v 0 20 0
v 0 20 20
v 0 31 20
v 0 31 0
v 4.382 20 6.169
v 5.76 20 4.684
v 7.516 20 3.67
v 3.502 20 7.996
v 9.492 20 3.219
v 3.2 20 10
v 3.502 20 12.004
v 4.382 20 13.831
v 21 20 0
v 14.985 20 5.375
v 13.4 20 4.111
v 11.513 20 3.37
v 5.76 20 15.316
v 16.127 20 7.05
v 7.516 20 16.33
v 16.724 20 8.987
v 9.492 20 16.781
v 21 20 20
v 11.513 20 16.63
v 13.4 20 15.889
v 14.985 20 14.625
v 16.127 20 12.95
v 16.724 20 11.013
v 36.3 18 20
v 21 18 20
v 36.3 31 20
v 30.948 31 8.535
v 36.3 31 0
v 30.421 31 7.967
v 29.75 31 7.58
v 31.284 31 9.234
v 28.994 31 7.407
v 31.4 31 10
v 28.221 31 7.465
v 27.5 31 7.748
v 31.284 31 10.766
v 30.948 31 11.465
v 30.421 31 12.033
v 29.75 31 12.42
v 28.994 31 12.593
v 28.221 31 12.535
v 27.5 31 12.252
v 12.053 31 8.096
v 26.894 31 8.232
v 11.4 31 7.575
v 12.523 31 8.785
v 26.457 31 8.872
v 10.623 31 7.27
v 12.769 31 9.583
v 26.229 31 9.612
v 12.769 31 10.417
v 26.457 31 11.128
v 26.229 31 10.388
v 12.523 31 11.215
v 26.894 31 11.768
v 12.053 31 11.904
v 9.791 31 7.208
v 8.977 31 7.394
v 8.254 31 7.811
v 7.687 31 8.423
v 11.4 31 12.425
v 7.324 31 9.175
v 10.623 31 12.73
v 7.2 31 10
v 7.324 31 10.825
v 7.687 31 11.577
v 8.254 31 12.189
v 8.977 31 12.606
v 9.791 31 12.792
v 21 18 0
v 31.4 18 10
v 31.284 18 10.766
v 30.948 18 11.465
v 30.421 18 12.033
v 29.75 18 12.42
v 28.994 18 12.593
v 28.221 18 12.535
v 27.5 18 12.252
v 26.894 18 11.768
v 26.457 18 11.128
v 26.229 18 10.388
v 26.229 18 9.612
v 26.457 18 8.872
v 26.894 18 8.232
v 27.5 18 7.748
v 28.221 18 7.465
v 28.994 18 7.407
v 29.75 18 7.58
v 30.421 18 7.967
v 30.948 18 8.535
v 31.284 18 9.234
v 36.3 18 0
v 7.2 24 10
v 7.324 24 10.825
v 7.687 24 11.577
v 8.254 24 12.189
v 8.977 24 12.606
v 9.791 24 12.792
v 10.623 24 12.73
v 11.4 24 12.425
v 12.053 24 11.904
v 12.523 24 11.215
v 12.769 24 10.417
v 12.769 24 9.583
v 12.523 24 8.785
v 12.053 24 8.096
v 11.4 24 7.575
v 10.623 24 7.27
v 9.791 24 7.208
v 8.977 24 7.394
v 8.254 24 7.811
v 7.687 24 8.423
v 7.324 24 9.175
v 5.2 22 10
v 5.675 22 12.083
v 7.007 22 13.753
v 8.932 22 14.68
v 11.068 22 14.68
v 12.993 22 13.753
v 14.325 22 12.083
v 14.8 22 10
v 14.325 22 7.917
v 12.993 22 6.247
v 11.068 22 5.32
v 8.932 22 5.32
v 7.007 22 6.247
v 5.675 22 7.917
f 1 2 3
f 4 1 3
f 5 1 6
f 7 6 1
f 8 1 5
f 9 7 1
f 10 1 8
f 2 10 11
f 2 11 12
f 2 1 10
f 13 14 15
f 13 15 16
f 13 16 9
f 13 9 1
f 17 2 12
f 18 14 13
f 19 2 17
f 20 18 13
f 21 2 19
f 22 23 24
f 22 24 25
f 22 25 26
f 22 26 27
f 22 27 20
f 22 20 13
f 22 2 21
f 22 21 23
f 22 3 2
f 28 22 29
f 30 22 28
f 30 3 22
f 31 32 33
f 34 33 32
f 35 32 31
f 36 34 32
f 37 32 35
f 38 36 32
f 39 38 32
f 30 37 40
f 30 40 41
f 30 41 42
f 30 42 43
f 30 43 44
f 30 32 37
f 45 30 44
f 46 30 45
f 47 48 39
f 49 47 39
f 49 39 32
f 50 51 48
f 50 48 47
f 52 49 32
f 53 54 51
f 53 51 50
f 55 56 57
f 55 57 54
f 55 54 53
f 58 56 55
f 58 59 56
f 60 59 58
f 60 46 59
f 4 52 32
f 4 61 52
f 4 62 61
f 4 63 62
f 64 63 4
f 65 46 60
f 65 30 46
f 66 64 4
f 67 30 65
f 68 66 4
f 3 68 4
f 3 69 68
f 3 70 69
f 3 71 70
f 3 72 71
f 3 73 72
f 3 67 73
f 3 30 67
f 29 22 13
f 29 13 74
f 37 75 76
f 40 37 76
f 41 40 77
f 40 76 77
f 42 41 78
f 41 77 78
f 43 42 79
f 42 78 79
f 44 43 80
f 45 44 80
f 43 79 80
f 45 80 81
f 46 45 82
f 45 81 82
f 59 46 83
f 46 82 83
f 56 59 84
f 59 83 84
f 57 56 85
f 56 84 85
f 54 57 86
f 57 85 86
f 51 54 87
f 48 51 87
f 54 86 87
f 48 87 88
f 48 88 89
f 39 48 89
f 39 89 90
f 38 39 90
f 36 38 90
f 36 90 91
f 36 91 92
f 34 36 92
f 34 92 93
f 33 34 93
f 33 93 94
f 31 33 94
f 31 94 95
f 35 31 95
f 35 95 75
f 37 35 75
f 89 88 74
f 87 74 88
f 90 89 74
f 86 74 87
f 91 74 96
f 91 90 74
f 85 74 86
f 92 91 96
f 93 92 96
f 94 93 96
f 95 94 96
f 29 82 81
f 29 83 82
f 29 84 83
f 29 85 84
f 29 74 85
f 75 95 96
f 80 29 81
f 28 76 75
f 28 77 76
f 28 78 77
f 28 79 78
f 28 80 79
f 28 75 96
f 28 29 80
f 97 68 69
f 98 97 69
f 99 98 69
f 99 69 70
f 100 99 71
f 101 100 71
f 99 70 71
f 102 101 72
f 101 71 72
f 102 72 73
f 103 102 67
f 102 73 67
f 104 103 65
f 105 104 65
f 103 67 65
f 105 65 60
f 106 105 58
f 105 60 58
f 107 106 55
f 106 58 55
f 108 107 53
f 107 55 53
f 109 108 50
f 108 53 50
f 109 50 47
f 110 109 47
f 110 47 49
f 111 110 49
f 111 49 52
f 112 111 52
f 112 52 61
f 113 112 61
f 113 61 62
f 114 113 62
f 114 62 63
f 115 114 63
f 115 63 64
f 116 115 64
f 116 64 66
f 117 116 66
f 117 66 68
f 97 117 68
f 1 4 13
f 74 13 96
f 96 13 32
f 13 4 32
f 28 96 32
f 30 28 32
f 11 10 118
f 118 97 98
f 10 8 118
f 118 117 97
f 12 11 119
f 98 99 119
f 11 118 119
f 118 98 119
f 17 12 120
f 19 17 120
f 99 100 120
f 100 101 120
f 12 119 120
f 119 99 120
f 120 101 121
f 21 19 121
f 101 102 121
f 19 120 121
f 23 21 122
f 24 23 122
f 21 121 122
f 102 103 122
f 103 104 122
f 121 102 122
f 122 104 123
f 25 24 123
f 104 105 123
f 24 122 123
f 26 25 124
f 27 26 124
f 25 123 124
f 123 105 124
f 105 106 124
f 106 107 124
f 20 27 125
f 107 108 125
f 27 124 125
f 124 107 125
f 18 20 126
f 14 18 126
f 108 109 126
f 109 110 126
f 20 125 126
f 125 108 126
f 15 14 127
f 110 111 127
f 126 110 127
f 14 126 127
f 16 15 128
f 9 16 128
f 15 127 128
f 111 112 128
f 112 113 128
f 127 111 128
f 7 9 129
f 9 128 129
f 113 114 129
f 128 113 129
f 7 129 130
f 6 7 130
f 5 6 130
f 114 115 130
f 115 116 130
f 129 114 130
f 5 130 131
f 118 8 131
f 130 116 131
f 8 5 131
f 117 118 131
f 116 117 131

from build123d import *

# Parameters (mm, degrees)
F0_W     = 20
F0_H     = 11
F1_DEPTH = 20
F2_R     = 2.8
F3_DEPTH = 25
F5_DEPTH = 20
F6_R     = 2.6
F7_DEPTH = 25
F8_SIZE  = 4


# Not quite as in the source:
# - a feature names something its author has since deleted; it is built from what else it names


with BuildPart() as f1:
    # F0 (on Top) → F1 (new body)
    with BuildSketch(Plane.XY):
        with Locations((10, 25.5)):
            Rectangle(F0_W, F0_H)
    extrude(amount=F1_DEPTH)

    # F2 (on face) → F3 (cut)
    with BuildSketch(Plane(origin=(0, 31, 0), x_dir=(-1, 0, 0), z_dir=(0, 1, 0))):
        with Locations((-10, 10)):
            Circle(F2_R)
    extrude(amount=-F3_DEPTH, mode=Mode.SUBTRACT)

    # F4 (on face) → F5 (join, through all)
    with BuildSketch(Plane.XY.offset(20)):
        Polygon((21, 20), (21, 18), (36.3, 18), (36.3, 31), (20, 31), (20, 20), align=None)
    extrude(amount=-F5_DEPTH)

    # F6 (on face) → F7 (cut)
    with BuildSketch(Plane.XZ.offset(-18)):
        with Locations((28.8, 10)):
            Circle(F6_R)
    extrude(amount=-F7_DEPTH, mode=Mode.SUBTRACT)

    # F8
    f8_edges = [f1.edges().sort_by_distance(p)[0] for p in [
        (12.8, 20, 10),
    ]]
    chamfer(f8_edges, length=F8_SIZE)


solid = f1.part
